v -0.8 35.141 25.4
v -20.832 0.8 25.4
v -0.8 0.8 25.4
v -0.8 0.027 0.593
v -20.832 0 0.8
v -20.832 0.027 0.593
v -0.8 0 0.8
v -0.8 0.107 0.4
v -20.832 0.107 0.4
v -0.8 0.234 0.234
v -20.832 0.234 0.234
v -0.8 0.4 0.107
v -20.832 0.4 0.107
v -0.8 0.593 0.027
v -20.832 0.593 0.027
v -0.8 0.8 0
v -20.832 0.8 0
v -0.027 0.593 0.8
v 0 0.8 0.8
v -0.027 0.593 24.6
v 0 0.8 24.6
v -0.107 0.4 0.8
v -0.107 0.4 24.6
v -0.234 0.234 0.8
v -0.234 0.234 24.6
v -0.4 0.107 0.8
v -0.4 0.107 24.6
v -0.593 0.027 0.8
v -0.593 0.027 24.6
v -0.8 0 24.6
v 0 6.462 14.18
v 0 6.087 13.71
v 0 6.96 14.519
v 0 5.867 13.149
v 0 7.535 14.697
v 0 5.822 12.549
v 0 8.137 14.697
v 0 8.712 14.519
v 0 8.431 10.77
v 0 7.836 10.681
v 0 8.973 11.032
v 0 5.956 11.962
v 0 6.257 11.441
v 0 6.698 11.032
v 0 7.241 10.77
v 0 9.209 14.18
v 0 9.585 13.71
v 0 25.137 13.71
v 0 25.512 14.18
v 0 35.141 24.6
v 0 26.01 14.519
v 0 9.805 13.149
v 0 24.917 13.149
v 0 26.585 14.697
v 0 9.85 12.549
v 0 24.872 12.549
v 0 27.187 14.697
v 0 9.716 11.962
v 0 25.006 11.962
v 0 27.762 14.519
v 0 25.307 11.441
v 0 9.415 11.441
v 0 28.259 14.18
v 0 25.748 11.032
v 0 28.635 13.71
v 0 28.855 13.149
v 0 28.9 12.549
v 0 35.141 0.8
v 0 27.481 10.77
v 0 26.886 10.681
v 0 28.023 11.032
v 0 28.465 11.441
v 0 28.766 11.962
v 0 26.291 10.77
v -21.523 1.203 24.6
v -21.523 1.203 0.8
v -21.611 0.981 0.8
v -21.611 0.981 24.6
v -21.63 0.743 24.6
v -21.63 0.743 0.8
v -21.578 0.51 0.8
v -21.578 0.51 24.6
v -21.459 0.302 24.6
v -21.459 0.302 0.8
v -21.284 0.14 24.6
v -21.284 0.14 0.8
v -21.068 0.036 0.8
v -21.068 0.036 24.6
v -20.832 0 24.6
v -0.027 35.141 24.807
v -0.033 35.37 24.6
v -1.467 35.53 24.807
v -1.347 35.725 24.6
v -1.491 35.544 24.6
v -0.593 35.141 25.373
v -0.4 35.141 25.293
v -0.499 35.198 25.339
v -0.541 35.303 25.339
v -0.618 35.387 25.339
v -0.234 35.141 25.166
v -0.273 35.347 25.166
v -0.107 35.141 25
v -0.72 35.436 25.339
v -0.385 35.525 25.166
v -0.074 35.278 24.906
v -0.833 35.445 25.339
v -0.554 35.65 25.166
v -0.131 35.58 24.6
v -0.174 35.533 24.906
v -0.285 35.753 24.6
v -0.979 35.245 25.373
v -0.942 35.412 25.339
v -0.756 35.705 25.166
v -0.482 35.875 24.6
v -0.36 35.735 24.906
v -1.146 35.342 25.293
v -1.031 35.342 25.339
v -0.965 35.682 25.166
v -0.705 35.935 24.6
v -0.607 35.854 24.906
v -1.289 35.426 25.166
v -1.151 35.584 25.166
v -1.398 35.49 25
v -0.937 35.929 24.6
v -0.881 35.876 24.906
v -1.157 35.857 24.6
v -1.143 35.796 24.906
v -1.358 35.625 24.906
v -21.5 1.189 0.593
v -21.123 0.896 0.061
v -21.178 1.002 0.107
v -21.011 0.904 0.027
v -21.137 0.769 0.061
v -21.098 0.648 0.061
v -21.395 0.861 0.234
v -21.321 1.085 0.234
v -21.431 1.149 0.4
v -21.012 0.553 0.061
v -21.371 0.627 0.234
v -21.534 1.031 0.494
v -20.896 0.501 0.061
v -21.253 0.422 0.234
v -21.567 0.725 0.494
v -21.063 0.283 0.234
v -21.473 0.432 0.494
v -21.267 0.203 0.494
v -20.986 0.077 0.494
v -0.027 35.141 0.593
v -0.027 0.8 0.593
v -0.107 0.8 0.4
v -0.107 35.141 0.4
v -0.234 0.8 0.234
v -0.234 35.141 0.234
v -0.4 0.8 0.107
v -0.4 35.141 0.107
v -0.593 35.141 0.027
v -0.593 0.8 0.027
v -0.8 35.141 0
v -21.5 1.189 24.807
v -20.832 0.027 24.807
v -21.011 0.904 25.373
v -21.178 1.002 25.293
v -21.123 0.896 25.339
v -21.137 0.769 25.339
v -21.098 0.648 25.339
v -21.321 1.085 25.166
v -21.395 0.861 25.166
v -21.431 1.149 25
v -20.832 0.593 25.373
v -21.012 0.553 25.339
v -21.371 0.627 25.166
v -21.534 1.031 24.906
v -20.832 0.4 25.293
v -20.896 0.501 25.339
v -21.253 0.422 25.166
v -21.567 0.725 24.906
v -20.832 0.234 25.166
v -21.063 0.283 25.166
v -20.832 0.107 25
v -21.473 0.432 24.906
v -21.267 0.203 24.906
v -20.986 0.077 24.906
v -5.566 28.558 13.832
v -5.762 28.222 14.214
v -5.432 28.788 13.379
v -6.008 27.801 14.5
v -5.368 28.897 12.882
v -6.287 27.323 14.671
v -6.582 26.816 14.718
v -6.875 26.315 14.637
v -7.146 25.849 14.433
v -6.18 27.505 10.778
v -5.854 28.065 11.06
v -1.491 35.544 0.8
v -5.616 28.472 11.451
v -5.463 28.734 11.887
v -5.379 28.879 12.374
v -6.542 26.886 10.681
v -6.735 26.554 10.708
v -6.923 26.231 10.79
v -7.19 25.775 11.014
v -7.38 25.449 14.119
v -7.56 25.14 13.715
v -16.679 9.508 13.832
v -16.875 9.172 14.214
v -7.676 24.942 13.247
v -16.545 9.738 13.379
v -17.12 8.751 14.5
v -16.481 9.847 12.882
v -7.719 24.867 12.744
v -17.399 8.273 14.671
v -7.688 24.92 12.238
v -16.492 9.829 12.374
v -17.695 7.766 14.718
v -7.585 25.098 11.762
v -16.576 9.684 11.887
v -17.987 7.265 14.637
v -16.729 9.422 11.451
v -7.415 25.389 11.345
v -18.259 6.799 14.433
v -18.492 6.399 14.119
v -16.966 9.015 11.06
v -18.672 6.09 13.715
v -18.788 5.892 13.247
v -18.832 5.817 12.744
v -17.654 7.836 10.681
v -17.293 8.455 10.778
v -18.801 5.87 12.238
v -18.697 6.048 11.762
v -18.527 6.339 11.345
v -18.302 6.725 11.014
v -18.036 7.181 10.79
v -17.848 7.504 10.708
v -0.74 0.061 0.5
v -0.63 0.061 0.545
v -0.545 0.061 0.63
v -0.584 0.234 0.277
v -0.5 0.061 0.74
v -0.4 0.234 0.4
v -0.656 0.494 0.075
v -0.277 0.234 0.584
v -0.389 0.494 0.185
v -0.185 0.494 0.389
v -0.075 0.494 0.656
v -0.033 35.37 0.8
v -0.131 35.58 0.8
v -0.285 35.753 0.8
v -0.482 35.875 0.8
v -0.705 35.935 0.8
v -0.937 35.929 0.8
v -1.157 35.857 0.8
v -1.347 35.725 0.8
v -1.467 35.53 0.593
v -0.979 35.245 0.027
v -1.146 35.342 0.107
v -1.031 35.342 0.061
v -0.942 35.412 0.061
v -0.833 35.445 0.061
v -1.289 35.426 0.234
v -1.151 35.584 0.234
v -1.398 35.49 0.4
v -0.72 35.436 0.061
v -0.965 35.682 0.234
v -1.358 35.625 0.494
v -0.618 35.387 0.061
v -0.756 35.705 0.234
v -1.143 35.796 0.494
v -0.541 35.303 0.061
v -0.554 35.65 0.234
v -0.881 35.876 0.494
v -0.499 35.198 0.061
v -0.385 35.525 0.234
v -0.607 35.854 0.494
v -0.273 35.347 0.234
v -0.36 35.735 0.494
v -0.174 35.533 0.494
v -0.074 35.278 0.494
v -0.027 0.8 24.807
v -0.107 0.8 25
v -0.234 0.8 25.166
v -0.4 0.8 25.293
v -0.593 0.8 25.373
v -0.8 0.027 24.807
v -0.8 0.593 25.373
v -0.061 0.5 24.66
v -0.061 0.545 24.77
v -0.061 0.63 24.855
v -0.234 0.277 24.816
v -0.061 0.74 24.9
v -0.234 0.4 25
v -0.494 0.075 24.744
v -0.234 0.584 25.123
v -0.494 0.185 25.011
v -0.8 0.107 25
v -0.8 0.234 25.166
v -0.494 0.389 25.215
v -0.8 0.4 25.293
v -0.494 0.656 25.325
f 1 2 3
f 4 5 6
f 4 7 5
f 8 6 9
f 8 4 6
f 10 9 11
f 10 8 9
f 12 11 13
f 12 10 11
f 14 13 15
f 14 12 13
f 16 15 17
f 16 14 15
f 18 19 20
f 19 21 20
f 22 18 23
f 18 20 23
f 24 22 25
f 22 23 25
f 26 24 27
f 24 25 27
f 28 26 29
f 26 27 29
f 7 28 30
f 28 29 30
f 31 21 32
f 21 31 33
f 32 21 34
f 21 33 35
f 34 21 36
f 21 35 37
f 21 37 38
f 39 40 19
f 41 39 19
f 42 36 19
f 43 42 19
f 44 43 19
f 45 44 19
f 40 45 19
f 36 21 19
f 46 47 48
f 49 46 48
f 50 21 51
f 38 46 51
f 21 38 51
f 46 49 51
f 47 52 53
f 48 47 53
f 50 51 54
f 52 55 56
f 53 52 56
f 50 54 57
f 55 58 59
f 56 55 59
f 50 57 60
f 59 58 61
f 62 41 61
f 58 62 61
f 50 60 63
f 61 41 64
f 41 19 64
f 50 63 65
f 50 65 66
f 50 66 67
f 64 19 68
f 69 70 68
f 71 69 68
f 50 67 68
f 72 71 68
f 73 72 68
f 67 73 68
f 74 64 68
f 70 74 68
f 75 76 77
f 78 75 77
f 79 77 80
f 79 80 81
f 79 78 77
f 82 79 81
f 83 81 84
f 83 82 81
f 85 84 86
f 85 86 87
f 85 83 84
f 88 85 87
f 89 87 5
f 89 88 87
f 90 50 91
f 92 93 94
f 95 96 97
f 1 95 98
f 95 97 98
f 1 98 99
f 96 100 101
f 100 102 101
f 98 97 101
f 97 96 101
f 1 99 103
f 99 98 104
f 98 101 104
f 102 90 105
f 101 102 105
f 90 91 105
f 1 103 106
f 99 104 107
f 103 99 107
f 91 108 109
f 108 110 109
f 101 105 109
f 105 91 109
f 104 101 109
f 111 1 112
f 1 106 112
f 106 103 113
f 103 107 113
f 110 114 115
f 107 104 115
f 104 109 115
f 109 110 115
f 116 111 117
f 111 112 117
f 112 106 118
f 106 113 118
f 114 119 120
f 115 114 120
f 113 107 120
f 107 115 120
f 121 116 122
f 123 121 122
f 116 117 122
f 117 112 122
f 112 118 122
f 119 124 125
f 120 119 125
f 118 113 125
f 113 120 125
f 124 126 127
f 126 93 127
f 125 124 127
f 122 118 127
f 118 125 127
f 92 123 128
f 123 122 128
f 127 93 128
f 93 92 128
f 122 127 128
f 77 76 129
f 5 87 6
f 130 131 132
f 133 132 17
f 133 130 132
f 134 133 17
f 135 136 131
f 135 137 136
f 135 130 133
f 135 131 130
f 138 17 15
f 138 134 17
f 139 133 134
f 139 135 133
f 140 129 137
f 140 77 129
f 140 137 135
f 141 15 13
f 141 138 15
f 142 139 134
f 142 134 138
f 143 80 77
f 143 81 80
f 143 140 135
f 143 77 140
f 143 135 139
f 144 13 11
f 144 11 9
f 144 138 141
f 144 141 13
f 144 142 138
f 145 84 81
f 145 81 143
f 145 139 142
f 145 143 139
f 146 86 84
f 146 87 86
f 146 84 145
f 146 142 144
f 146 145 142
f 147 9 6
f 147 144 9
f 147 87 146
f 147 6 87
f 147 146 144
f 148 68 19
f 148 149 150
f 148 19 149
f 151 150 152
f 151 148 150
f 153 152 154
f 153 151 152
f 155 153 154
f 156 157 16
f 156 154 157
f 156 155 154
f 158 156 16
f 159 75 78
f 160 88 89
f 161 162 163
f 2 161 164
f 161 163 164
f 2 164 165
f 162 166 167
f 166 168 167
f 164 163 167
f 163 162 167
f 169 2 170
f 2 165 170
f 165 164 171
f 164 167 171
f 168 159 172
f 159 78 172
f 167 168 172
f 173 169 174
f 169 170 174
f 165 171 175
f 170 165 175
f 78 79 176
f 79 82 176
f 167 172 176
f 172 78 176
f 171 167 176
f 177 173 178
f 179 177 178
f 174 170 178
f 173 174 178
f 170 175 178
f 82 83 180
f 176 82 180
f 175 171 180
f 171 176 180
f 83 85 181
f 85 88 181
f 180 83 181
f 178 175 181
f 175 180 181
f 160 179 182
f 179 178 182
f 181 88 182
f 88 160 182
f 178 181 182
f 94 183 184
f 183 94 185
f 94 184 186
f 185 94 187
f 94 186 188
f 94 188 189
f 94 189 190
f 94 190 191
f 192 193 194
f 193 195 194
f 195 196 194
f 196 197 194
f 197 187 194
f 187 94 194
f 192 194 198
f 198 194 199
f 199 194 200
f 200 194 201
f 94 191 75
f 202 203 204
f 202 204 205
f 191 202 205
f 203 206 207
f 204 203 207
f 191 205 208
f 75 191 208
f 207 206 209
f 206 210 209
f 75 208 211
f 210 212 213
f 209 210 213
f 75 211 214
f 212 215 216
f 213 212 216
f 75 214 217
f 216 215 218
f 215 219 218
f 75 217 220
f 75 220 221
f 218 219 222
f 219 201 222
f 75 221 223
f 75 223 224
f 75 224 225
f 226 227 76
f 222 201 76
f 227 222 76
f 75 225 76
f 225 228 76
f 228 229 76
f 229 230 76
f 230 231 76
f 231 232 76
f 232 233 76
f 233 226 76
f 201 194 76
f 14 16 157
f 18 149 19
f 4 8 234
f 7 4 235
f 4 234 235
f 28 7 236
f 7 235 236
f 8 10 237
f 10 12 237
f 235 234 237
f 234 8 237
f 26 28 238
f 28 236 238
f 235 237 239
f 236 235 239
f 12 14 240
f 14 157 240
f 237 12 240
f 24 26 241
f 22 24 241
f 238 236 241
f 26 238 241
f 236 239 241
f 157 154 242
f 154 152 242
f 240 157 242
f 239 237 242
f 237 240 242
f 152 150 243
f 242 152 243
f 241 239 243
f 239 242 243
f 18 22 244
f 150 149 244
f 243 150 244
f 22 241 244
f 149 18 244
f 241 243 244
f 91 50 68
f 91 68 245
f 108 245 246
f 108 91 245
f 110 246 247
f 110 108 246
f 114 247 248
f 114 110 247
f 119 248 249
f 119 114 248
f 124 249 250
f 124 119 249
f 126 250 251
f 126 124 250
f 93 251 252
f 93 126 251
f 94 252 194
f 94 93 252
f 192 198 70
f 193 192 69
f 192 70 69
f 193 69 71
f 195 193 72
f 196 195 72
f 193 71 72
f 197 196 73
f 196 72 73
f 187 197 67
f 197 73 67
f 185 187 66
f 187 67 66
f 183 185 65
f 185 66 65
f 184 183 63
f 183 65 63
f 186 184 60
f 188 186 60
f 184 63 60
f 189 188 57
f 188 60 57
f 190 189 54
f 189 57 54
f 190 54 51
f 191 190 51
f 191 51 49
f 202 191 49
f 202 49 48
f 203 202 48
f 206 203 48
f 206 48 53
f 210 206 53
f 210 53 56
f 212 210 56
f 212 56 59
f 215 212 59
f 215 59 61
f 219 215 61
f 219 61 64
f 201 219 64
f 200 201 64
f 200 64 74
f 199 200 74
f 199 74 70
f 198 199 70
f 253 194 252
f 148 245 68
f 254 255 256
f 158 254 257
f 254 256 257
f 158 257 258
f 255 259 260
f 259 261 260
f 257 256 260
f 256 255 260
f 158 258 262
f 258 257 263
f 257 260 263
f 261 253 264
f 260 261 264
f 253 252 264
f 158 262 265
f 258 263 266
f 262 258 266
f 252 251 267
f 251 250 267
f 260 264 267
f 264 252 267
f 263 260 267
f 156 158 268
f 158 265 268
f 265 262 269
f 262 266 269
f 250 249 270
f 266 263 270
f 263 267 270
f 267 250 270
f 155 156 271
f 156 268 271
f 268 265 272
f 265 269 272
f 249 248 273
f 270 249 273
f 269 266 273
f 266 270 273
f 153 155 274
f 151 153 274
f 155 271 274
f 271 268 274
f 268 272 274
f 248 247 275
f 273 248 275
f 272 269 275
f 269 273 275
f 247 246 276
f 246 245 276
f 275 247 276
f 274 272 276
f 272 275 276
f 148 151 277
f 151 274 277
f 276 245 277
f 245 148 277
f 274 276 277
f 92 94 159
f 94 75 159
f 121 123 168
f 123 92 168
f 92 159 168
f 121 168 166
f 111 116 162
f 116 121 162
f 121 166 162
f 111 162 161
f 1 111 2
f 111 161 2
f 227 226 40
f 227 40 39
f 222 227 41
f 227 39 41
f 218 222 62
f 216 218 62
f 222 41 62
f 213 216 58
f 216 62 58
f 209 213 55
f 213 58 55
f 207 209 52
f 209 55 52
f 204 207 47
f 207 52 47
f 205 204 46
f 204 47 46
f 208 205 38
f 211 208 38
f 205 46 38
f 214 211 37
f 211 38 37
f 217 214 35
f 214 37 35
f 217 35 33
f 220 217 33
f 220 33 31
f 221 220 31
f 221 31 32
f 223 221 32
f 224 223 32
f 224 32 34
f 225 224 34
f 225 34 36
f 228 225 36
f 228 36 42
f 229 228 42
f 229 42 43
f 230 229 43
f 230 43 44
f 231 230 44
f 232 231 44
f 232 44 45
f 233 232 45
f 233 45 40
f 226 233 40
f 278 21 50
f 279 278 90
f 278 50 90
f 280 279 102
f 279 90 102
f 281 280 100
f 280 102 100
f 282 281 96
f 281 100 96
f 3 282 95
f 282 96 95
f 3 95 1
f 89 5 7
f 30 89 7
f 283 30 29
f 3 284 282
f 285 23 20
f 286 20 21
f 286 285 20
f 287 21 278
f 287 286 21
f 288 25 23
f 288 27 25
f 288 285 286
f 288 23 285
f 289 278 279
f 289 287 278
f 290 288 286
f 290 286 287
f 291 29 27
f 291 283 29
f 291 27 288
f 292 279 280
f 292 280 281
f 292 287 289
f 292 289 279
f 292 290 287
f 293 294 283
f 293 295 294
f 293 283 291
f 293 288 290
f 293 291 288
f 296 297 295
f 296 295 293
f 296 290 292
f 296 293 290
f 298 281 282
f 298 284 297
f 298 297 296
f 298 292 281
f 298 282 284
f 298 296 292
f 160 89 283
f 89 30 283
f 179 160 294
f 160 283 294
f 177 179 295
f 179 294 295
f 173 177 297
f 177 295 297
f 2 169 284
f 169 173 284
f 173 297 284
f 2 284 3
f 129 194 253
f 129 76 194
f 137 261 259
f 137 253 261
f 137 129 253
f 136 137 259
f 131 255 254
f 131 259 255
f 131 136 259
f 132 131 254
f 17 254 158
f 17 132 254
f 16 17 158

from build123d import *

# Parameters (mm, degrees)
BOSS_EXTRUDE1_DEPTH = 25.4
FILLET1_R           = 0.8
SKETCH2_R           = 2.0193
CUT_EXTRUDE1_DEPTH  = 50.8


with BuildPart() as part:
    # Sketch1 → Boss-Extrude1 (new body)
    with BuildSketch(Plane.XY):
        Polygon((0, 0), (0, 38.1), (-22.225, 0), align=None)
    extrude(amount=BOSS_EXTRUDE1_DEPTH)

    # Fillet1
    fillet1_edges = [part.edges().sort_by_distance(p)[0] for p in [
        (-11.1125, 19.05, 25.4),
        (-11.1125, 19.05, 0),
        (0, 19.05, 0),
        (-11.1125, 0, 0),
        (-11.1125, 0, 25.4),
        (-22.225, 0, 12.7),
        (0, 38.1, 12.7),
        (0, 0, 12.7),
        (0, 19.05, 25.4),
    ]]
    fillet(fillet1_edges, radius=FILLET1_R)

    # Sketch2 → Cut-Extrude1 (cut)
    with BuildSketch(Plane(origin=(0, 0, 0), x_dir=(0, 0, -1), z_dir=(1, 0, 0))):
        with Locations((-12.7, 26.885863544)):
            Circle(SKETCH2_R)
        with Locations((-12.7, 7.835863544)):
            Circle(SKETCH2_R)
    extrude(amount=-CUT_EXTRUDE1_DEPTH, mode=Mode.SUBTRACT)


solid = part.part
